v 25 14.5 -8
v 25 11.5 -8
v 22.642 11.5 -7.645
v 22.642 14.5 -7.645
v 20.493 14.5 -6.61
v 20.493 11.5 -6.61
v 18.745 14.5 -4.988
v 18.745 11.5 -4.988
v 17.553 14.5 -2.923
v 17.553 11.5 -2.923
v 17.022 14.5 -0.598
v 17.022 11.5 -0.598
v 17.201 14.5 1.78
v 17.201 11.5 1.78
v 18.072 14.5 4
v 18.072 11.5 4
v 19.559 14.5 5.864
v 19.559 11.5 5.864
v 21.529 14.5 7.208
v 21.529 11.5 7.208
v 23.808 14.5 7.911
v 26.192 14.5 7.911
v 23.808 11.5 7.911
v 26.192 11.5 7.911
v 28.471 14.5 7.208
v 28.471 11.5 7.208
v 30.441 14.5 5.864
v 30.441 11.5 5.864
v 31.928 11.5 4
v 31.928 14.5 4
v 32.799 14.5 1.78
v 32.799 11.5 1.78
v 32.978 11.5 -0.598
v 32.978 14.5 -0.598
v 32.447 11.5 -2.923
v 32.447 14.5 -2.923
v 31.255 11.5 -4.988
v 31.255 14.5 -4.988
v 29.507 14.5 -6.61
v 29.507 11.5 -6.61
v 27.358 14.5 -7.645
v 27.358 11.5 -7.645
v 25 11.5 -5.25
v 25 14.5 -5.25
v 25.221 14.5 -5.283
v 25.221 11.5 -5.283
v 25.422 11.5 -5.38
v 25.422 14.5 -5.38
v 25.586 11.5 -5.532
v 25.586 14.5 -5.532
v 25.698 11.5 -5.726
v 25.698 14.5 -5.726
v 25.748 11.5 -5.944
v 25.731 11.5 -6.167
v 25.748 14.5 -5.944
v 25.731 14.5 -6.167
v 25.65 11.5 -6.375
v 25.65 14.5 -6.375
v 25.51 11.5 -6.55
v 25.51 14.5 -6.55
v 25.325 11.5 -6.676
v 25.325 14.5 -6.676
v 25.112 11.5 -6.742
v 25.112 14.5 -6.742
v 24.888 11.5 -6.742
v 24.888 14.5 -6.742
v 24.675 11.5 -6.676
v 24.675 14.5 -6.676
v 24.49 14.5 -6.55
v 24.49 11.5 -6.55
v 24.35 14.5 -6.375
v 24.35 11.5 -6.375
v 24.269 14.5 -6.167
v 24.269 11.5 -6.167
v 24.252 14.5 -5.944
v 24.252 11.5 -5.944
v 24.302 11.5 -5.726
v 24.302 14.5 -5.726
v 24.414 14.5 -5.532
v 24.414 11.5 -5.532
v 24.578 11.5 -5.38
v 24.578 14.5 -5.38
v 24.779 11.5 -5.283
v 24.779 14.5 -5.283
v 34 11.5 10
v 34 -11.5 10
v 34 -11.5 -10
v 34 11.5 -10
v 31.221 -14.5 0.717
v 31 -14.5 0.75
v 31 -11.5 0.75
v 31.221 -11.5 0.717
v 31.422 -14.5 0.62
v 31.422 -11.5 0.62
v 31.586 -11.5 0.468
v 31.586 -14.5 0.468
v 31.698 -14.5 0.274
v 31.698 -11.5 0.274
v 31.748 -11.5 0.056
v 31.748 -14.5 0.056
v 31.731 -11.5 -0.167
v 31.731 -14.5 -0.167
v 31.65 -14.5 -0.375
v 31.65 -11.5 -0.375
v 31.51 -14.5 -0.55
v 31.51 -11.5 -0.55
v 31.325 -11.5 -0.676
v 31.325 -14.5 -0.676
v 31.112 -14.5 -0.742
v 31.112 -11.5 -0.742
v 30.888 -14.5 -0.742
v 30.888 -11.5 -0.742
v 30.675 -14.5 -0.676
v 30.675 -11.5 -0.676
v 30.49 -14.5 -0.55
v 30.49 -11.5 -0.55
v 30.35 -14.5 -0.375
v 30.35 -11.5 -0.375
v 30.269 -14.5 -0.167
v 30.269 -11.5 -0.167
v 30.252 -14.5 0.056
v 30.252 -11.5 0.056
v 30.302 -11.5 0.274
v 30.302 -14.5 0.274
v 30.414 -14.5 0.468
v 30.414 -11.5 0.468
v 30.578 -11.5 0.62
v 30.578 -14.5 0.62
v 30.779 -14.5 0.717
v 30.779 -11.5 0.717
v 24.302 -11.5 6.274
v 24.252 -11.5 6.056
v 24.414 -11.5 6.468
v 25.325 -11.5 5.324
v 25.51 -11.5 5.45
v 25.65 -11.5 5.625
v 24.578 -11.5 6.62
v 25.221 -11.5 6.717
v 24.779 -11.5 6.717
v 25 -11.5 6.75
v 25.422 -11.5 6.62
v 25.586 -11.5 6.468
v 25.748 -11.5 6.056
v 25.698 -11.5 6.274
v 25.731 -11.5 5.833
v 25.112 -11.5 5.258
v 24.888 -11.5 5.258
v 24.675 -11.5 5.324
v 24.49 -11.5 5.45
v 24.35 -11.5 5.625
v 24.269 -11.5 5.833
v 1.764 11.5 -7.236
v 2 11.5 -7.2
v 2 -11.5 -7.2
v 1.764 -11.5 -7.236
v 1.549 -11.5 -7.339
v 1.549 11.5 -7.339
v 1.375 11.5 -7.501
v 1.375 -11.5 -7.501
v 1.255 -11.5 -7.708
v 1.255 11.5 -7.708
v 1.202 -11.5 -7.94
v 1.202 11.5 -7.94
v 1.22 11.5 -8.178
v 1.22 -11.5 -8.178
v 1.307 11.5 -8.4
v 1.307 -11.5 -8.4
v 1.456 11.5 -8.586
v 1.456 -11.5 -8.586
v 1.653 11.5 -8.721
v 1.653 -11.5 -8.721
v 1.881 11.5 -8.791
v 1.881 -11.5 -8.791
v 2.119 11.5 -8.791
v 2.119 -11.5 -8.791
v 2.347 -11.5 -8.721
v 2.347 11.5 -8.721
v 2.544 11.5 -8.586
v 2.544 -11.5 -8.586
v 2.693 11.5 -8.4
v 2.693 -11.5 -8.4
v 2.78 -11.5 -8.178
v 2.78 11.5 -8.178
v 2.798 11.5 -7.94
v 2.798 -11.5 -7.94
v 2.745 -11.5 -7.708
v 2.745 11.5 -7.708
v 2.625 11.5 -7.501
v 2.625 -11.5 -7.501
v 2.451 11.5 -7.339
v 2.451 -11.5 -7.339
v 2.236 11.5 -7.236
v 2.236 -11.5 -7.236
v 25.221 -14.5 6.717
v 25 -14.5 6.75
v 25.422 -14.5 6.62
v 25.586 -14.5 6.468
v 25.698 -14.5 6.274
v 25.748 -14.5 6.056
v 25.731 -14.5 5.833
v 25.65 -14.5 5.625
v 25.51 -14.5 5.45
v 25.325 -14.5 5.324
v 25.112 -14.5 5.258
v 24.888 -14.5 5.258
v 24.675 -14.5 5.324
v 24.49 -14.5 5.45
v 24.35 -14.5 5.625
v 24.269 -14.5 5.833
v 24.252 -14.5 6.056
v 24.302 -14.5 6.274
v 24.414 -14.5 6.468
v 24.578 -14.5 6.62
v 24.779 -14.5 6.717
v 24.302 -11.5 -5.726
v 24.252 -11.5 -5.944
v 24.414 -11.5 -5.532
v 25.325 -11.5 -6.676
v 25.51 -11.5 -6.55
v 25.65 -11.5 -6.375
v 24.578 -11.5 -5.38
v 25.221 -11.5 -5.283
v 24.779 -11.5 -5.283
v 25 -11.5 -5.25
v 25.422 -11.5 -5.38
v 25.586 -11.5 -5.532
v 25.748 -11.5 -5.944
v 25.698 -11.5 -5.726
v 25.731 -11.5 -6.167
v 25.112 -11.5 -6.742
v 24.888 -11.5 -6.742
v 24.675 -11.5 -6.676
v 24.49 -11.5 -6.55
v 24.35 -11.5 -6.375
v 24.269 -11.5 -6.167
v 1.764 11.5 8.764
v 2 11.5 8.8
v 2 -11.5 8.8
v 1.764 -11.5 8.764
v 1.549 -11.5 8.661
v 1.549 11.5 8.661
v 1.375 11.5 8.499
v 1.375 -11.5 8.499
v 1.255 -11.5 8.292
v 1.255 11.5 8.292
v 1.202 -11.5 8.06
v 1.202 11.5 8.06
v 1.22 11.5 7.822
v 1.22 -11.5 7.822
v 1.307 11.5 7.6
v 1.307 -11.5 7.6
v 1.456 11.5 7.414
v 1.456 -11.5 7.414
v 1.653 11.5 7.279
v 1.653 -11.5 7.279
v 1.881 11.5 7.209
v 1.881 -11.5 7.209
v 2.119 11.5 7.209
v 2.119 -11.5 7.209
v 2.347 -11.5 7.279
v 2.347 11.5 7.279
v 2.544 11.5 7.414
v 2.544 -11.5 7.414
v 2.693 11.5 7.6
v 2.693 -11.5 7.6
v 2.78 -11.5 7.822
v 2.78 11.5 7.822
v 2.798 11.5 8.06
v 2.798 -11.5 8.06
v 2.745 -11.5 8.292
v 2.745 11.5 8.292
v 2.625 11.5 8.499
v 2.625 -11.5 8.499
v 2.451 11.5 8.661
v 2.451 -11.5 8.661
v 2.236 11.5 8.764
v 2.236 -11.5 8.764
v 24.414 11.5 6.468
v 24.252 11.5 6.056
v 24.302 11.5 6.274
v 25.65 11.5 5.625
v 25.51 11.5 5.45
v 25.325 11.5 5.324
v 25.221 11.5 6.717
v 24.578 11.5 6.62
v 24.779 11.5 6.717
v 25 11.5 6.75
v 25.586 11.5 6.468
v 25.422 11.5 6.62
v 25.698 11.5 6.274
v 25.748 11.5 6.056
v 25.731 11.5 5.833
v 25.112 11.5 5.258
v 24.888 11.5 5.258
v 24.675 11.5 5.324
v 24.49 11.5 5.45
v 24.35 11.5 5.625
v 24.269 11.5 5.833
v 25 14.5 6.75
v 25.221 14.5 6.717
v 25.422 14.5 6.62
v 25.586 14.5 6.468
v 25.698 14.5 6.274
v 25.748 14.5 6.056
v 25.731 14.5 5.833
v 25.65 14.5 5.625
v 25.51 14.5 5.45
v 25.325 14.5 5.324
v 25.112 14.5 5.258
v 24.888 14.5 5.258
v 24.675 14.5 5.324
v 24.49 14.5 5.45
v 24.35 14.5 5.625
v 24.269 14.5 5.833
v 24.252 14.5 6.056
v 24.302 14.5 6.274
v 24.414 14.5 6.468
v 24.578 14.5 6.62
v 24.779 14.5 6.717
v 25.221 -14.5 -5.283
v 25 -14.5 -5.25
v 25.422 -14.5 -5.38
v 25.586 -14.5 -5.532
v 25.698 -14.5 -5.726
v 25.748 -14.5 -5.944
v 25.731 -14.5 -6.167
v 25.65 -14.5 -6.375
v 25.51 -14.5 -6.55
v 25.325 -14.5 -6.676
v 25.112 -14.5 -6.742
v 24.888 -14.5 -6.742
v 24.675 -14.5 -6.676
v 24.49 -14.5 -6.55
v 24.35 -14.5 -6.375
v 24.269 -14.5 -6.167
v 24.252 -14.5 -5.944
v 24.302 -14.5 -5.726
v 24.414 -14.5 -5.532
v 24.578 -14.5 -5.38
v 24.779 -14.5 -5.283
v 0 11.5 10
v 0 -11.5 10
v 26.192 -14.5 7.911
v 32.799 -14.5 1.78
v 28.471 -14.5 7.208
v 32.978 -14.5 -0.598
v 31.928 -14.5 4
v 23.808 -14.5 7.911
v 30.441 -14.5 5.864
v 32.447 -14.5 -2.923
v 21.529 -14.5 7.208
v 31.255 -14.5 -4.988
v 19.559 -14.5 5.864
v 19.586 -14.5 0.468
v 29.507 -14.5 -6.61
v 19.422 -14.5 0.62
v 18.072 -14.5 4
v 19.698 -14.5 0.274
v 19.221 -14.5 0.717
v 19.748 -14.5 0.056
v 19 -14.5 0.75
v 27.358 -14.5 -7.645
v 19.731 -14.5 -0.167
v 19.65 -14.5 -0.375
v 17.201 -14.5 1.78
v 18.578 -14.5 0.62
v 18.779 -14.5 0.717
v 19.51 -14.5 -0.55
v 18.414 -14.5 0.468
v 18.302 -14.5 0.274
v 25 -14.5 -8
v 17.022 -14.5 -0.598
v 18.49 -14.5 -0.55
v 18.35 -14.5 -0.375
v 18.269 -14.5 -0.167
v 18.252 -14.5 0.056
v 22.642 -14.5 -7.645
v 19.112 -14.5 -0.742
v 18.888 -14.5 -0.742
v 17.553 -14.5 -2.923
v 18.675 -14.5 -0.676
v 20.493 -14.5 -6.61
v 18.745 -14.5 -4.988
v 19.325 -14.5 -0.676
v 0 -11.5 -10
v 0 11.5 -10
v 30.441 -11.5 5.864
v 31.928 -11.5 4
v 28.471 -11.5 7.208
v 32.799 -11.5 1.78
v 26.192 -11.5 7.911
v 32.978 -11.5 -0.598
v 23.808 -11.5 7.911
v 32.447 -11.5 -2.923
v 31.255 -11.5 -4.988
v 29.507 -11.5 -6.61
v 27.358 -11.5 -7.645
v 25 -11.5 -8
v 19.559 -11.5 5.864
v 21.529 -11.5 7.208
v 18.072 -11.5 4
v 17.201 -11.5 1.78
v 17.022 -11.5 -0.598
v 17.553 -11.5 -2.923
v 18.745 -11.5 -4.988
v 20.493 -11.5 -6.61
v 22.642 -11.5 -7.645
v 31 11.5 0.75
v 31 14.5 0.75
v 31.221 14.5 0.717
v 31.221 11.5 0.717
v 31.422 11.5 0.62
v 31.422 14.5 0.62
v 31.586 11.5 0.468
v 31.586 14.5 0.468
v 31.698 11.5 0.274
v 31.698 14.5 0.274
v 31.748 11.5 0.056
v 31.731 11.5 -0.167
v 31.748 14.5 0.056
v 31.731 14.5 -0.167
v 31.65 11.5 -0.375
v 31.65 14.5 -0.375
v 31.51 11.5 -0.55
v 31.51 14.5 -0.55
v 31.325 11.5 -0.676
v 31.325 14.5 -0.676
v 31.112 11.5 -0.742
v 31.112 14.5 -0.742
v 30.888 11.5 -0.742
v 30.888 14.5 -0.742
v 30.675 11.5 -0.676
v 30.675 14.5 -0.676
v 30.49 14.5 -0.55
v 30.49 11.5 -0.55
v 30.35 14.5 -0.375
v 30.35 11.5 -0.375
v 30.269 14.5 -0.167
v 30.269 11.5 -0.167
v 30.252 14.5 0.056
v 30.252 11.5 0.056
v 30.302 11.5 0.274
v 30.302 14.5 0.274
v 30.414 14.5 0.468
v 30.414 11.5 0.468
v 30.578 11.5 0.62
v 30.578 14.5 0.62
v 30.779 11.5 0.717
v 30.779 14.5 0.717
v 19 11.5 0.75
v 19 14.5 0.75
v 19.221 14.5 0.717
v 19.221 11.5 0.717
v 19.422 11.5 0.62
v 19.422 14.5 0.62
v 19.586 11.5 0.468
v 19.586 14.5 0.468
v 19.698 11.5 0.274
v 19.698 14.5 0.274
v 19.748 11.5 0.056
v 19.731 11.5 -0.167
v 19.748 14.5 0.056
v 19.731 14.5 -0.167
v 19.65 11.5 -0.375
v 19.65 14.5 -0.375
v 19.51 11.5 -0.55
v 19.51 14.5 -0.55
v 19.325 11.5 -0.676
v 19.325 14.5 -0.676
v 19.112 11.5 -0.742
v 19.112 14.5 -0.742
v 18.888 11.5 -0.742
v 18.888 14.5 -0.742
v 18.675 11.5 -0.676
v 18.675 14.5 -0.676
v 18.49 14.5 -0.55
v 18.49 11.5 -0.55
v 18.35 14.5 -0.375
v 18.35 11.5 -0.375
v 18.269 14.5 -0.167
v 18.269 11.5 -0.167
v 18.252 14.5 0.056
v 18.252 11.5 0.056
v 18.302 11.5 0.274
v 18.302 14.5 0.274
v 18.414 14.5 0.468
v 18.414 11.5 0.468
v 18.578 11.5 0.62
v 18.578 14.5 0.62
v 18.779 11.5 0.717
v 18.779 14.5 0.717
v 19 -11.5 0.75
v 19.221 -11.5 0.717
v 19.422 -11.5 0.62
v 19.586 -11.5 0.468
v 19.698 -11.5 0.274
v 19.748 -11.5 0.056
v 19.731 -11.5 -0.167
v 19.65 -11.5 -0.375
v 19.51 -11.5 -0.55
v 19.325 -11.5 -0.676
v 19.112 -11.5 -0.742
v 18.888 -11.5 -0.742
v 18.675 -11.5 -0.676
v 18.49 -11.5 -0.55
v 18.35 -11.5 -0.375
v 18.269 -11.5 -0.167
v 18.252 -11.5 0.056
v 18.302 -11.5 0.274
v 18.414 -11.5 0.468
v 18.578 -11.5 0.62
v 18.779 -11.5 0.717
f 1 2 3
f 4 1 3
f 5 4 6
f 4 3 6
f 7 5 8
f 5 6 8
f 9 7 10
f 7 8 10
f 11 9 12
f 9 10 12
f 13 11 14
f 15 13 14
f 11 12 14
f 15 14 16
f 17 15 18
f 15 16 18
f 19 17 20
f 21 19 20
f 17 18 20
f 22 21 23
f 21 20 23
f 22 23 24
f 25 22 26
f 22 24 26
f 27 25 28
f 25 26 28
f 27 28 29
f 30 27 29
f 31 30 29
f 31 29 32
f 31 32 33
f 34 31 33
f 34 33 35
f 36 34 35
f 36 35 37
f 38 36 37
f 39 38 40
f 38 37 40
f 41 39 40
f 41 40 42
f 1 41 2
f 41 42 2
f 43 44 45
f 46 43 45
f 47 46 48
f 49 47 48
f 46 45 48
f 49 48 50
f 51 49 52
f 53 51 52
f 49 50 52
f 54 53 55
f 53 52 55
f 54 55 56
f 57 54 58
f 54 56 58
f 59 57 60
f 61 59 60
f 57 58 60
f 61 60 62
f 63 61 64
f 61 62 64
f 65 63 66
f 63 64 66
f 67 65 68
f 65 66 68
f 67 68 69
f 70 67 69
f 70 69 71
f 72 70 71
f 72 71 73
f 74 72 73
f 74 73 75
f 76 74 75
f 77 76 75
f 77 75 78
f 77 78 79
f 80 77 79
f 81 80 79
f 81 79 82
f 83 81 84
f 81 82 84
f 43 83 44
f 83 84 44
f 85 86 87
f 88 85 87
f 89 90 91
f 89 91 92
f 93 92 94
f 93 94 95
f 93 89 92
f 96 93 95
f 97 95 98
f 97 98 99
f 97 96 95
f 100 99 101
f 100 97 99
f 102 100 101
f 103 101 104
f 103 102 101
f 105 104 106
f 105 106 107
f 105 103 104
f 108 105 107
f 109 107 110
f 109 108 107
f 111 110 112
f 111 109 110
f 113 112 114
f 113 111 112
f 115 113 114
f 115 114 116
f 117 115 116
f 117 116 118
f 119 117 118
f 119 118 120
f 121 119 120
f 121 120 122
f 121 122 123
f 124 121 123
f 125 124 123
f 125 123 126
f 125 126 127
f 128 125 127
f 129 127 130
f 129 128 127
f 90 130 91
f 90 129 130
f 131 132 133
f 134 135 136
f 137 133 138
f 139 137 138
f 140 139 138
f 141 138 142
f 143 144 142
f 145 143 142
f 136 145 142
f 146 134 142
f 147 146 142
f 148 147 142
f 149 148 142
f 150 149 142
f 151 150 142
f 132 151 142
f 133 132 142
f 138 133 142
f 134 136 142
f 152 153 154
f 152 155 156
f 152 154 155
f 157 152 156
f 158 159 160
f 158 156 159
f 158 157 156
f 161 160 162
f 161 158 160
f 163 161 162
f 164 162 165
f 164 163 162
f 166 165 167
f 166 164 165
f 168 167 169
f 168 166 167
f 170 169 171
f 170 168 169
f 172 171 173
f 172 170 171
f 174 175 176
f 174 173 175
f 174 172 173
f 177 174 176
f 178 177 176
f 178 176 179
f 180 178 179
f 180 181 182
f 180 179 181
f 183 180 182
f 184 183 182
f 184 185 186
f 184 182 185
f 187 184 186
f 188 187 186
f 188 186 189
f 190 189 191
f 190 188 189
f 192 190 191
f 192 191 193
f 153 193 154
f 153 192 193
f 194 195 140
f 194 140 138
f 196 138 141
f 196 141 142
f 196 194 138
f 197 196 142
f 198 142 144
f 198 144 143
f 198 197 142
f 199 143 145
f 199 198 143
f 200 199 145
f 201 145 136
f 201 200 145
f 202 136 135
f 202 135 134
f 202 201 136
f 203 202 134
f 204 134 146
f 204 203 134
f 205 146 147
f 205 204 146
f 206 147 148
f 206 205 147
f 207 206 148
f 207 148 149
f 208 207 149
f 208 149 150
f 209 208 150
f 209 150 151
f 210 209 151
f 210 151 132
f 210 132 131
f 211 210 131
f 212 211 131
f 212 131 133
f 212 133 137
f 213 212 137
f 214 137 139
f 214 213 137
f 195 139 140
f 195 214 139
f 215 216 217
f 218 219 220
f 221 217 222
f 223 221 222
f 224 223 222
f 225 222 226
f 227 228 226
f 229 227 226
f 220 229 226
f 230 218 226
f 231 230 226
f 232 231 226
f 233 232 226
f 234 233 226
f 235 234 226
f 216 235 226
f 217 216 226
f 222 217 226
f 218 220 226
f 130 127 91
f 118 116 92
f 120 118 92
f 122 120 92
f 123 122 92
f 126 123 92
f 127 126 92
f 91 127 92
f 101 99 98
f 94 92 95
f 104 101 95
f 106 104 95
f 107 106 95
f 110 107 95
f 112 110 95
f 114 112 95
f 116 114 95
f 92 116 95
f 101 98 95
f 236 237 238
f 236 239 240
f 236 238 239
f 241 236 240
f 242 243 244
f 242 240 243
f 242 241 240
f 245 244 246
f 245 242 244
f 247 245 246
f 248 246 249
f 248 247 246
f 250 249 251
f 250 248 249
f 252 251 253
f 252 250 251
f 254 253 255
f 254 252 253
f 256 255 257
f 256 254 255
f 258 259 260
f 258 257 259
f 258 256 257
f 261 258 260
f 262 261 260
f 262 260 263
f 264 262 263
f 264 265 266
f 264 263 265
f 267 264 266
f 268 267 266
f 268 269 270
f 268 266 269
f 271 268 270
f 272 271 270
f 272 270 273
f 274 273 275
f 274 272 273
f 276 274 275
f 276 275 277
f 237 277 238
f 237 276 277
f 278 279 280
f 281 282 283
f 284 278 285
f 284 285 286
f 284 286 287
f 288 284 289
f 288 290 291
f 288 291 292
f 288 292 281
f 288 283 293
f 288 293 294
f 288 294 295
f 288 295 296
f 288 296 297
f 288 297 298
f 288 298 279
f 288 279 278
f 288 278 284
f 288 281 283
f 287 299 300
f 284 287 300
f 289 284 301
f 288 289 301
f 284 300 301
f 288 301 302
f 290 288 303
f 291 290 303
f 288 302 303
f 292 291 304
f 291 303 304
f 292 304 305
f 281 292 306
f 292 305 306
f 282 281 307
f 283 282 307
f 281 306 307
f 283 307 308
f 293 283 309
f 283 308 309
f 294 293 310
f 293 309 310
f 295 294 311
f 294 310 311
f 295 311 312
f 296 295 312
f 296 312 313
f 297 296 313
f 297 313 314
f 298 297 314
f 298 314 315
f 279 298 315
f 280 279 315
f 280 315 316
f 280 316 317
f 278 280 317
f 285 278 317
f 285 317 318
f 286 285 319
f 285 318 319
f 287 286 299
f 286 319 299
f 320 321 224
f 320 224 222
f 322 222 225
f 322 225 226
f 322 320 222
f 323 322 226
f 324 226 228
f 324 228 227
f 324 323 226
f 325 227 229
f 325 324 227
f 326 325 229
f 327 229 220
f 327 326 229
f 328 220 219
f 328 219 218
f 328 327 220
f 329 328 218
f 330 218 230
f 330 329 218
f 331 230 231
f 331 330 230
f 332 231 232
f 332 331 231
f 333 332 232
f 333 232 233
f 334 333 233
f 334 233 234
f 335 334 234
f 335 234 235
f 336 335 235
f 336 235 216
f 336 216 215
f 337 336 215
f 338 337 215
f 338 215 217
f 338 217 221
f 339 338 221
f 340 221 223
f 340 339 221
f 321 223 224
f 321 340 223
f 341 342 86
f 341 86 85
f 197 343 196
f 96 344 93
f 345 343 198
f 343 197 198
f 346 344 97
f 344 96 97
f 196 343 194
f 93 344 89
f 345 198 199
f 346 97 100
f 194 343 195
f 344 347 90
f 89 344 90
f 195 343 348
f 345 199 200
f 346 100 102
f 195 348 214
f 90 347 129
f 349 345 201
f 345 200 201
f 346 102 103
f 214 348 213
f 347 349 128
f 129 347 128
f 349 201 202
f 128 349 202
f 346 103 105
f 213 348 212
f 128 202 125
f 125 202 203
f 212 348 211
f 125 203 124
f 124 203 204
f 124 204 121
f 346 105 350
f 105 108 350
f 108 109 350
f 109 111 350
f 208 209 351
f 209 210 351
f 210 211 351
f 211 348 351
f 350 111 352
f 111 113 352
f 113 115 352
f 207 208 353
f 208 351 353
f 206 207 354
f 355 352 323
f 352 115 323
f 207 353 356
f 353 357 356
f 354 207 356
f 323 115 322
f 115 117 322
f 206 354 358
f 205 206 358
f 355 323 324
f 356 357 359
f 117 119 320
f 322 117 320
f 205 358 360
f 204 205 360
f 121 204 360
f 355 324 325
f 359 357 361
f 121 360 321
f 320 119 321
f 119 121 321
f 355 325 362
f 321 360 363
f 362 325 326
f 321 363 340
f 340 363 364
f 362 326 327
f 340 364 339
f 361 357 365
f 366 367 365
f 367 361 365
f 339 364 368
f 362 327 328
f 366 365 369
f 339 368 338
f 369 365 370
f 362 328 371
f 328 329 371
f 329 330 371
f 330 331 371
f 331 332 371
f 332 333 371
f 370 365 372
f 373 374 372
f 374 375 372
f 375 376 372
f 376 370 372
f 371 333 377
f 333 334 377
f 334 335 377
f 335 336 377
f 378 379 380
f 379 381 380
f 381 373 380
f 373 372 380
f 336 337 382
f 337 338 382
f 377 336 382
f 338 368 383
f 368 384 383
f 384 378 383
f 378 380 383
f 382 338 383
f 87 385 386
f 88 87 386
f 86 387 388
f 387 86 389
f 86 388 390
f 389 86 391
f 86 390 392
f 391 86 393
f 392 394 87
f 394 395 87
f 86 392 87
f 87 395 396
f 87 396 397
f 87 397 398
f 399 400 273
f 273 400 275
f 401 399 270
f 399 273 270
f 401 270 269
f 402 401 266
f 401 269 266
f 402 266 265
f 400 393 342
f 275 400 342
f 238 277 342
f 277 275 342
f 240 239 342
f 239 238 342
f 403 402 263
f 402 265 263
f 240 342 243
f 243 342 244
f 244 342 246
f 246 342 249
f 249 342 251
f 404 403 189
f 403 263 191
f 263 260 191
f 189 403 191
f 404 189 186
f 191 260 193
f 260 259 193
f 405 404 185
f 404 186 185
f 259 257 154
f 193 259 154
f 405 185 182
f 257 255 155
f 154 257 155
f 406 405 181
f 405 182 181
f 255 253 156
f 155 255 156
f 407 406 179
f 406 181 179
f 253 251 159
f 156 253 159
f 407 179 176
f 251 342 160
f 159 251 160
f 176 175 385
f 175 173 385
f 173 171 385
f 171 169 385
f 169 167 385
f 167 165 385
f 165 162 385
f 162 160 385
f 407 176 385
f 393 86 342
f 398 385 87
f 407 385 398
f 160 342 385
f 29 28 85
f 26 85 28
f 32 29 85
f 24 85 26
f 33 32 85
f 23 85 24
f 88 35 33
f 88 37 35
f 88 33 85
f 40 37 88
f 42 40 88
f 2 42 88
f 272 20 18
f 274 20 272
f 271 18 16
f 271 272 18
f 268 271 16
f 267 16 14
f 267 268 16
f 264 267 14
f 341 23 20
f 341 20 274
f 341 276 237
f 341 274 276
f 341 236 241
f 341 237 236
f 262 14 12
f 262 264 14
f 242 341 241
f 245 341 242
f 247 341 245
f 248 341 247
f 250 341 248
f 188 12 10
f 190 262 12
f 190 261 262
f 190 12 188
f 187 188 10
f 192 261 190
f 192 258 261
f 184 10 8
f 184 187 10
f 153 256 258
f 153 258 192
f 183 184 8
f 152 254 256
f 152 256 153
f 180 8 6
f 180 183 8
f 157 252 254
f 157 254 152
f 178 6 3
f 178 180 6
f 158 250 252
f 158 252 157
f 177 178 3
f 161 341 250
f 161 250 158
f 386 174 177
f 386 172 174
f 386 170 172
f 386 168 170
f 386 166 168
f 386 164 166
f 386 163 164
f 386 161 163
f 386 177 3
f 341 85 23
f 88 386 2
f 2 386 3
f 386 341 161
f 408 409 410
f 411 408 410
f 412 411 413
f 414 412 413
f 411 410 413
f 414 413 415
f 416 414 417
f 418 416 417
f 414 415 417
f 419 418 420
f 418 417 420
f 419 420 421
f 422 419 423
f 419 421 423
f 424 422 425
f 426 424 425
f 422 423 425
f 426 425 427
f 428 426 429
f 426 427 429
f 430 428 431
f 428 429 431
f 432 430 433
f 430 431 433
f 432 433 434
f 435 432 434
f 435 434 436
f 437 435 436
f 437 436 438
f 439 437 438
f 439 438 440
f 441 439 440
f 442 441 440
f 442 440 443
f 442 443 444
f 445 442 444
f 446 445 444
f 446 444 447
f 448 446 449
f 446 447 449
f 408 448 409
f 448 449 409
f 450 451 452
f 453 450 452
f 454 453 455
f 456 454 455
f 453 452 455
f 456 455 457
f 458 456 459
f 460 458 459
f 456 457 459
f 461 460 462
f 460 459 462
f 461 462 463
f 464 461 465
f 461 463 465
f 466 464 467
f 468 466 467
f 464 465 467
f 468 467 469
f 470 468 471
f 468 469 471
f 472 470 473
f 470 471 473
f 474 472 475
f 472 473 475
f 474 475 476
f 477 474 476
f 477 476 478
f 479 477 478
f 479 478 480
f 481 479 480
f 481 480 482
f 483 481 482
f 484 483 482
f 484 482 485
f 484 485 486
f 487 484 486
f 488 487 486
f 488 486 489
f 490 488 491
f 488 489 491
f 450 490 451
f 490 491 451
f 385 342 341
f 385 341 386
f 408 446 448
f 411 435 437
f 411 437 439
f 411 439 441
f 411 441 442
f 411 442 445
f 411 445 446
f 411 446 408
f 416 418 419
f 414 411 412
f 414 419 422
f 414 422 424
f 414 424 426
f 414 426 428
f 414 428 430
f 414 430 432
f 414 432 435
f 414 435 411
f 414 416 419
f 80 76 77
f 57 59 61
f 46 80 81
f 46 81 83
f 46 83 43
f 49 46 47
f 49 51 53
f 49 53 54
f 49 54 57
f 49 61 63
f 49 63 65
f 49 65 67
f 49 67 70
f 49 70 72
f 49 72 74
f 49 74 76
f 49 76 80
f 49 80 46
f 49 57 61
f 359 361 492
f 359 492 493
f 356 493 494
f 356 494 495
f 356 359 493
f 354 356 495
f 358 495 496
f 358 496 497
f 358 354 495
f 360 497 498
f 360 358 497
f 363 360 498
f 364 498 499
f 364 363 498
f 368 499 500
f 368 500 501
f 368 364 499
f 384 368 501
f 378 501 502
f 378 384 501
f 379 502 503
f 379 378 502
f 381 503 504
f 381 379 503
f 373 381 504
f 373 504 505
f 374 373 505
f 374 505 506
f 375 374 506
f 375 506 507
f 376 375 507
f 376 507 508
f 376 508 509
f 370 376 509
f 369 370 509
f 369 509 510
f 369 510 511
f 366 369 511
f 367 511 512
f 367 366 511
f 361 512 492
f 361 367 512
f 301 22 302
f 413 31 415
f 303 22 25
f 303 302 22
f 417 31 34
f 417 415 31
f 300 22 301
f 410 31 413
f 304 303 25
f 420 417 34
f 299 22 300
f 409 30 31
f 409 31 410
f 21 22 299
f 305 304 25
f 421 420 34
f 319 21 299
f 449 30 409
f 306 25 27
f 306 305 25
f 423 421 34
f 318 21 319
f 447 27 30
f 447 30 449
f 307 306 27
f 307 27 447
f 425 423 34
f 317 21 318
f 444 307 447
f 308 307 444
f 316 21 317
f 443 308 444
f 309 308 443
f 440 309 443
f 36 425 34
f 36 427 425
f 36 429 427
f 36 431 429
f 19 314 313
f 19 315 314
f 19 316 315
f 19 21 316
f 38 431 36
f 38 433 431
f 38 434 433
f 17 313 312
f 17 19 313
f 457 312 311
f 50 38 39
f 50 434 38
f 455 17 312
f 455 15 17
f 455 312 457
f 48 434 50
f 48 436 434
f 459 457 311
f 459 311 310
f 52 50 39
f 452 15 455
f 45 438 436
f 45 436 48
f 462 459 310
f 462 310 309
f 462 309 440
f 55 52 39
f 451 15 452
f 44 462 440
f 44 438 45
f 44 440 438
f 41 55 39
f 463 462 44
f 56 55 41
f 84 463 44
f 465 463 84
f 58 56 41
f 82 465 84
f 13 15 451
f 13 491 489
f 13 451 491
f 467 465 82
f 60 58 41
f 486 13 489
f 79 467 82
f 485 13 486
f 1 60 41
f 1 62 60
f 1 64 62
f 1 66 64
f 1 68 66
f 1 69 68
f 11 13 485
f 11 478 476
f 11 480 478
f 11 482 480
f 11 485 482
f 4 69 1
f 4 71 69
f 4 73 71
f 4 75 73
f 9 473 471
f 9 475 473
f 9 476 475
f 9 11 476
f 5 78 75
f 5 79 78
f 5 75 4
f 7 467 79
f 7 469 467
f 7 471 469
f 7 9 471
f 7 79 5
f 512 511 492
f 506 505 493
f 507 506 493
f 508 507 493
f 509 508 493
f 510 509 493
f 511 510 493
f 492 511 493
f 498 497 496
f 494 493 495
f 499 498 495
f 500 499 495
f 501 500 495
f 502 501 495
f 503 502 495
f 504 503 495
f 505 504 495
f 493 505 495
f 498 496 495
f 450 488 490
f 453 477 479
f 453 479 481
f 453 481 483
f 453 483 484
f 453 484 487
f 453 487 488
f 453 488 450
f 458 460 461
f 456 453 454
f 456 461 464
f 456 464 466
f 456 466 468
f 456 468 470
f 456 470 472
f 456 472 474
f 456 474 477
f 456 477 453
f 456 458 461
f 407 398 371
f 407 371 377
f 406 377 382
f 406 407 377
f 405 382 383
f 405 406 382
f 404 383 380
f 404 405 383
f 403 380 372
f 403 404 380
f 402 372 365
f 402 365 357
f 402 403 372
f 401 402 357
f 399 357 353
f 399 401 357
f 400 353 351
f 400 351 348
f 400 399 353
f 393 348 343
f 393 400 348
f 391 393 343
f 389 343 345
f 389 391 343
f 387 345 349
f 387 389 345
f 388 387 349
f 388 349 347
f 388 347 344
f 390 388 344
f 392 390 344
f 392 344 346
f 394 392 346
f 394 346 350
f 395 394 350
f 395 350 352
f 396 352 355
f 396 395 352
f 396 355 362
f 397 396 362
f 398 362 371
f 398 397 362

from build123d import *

# Parameters (mm, degrees)
SKETCH_1_W               = 20
SKETCH_1_H               = 23
EXTRUDE_1_DEPTH          = 34
CUT_EXTRUDE_1_DEPTH      = 10
CUT_EXTRUDE_1_DEPTH_BACK = 34
SKETCH_2_R               = 0.8
SKETCH_3_R               = 8
EXTRUDE_2_DEPTH          = 3
SKETCH_4_R               = 0.75
CUT_EXTRUDE_2_DEPTH      = 3


with BuildPart() as part:
    # 草图1 → 凸台-拉伸1 (new body)
    with BuildSketch(Plane(origin=(0, 0, 0), x_dir=(0, 0, -1), z_dir=(1, 0, 0))):
        Rectangle(SKETCH_1_W, SKETCH_1_H)
    extrude(amount=EXTRUDE_1_DEPTH)

    # 草图2 → 切除-拉伸1 (cut, two sides: drawn at the far end of the back side and taken through both)
    with BuildSketch(Plane(origin=(0, -11.5, 0), x_dir=(-1, 0, 0), z_dir=(0, -1, 0)).offset(-CUT_EXTRUDE_1_DEPTH_BACK)):
        with Locations(Location((-2, -8, 0), (0, 0, 270))):
            Circle(SKETCH_2_R)
        with Locations(Location((-2, 8, 0), (0, 0, 270))):
            Circle(SKETCH_2_R)
    extrude(amount=CUT_EXTRUDE_1_DEPTH + CUT_EXTRUDE_1_DEPTH_BACK, mode=Mode.SUBTRACT)

    # 草图3 → 凸台-拉伸2 (add)
    with BuildSketch(Plane(origin=(0, 11.5, 0), x_dir=(1, 0, 0), z_dir=(0, 1, 0))):
        with Locations(Location((25, 0, 0), (0, 0, 90))):
            Circle(SKETCH_3_R)
    extrude_2 = extrude(amount=EXTRUDE_2_DEPTH)

    # 镜向1: 凸台-拉伸2 across plane
    add(extrude_2.mirror(Plane.ZX))

    # 草图4 → 切除-拉伸2 (cut)
    with BuildSketch(Plane(origin=(0, 14.5, 0), x_dir=(1, 0, 0), z_dir=(0, 1, 0))):
        with Locations(Location((25, -6, 0), (0, 0, 270))):
            Circle(SKETCH_4_R)
        with Locations((45.5, 14.5)):
            Circle(SKETCH_4_R)
        with Locations((25, 35)):
            Circle(SKETCH_4_R)
        with Locations((4.5, 14.5)):
            Circle(SKETCH_4_R)
        with Locations(Location((19, 0, 0), (0, 0, 270))):
            Circle(SKETCH_4_R)
        with Locations(Location((25, 6, 0), (0, 0, 270))):
            Circle(SKETCH_4_R)
        with Locations(Location((31, 0, 0), (0, 0, 270))):
            Circle(SKETCH_4_R)
    cut_extrude_2 = extrude(amount=-CUT_EXTRUDE_2_DEPTH, mode=Mode.SUBTRACT)

    # 镜向2: 切除-拉伸2 across plane
    add(cut_extrude_2.mirror(Plane.ZX), mode=Mode.SUBTRACT)


solid = part.part
